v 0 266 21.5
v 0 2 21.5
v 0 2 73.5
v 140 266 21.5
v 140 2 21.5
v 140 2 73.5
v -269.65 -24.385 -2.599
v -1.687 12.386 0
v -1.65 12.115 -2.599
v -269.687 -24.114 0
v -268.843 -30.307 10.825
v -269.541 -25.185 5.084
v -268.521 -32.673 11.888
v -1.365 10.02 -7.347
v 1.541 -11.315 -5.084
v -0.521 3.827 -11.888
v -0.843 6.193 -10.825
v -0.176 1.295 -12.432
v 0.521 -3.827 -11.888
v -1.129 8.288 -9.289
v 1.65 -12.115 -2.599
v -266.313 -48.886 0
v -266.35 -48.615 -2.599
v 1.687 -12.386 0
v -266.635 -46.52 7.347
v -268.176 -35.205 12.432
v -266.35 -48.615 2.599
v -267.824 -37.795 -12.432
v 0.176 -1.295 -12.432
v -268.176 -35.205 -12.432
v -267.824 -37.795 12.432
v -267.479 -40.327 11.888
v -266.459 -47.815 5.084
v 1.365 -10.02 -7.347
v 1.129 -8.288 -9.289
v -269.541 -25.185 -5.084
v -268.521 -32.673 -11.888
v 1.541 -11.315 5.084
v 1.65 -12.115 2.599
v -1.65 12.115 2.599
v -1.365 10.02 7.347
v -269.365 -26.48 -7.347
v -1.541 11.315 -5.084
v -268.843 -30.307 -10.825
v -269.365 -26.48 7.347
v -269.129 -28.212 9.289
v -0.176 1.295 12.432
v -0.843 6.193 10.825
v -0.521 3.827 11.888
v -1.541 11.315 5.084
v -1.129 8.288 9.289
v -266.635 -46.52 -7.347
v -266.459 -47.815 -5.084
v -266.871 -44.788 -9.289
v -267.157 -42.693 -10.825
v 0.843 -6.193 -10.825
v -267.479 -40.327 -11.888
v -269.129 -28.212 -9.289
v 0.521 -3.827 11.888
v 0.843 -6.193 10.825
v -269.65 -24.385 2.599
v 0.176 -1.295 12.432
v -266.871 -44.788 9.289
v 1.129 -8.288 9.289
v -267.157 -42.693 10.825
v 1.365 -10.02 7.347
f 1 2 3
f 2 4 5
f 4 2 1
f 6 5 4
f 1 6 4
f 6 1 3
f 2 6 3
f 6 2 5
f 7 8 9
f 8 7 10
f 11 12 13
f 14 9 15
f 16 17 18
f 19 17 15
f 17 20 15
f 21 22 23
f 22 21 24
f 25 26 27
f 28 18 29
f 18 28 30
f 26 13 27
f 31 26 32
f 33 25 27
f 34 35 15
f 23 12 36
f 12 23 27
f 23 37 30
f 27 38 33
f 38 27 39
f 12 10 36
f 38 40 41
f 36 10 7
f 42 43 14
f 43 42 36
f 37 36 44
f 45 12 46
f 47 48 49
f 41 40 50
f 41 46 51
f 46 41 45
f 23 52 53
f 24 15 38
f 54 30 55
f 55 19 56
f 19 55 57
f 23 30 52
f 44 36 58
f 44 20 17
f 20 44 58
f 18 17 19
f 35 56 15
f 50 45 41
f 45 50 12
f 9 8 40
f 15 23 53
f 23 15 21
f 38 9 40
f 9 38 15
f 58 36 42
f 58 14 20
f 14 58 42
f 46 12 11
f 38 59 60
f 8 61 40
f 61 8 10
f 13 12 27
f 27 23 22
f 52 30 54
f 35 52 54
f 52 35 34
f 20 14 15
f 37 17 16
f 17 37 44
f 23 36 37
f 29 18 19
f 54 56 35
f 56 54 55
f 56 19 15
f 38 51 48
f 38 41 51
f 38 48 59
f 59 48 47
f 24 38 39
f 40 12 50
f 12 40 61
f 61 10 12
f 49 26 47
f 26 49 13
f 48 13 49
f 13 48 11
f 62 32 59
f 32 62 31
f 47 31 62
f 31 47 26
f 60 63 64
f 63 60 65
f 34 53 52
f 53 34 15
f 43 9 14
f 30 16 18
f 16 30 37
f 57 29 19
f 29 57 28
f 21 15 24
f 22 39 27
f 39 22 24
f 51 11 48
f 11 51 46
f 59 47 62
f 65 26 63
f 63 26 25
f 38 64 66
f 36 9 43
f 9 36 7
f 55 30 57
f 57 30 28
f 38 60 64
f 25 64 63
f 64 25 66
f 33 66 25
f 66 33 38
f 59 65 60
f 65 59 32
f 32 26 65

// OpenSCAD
wall_thickness = 2;
tray_width = 144;
upper_tray_depth = 128;
lower_tray_depth = 140;
lower_tray_height_min = 35;
upper_tray_height = 65;
upper_ramp_height = 56;
lower_ramp_height = 19.5;
ramp_delta_height = upper_ramp_height - lower_ramp_height;
total_tray_depth = upper_tray_depth + lower_tray_depth;
ramp_hypotenuse = sqrt(ramp_delta_height ^ 2 + total_tray_depth ^ 2);
ramp_angle = atan(total_tray_depth/ramp_delta_height);
cylinder_radius = 25 / 2;
echo(ramp_delta_height);
echo(ramp_angle);
ramp_max = upper_ramp_height + lower_ramp_height - wall_thickness;

difference() {
  translate([0, 0, lower_ramp_height]) {
    rotate([90,0,90]){
      linear_extrude(tray_width - wall_thickness * 2) {
        polygon([
          [wall_thickness,wall_thickness],
          [wall_thickness, upper_ramp_height - wall_thickness],
          [upper_tray_depth+lower_tray_depth - wall_thickness, wall_thickness]
        ]);
      }
    }
  }
}

module marble_channel() {
  rotate([270,0,180-ramp_angle]) {
    cylinder(ramp_hypotenuse, cylinder_radius, cylinder_radius);
  }
}

marble_channel();


// rotate([ramp_angle,0,0]) {
//   translate([cylinder_radius,  lower_ramp_height * 2, -total_tray_depth]) {
//       cylinder(ramp_hypotenuse, cylinder_radius, cylinder_radius);
//   }
// }
// difference() {
//   union() {
//     cube([144,128,65]);
//     translate([0,128,0]){
//       cube([144,140,35]);
//     }
//   }
// }
